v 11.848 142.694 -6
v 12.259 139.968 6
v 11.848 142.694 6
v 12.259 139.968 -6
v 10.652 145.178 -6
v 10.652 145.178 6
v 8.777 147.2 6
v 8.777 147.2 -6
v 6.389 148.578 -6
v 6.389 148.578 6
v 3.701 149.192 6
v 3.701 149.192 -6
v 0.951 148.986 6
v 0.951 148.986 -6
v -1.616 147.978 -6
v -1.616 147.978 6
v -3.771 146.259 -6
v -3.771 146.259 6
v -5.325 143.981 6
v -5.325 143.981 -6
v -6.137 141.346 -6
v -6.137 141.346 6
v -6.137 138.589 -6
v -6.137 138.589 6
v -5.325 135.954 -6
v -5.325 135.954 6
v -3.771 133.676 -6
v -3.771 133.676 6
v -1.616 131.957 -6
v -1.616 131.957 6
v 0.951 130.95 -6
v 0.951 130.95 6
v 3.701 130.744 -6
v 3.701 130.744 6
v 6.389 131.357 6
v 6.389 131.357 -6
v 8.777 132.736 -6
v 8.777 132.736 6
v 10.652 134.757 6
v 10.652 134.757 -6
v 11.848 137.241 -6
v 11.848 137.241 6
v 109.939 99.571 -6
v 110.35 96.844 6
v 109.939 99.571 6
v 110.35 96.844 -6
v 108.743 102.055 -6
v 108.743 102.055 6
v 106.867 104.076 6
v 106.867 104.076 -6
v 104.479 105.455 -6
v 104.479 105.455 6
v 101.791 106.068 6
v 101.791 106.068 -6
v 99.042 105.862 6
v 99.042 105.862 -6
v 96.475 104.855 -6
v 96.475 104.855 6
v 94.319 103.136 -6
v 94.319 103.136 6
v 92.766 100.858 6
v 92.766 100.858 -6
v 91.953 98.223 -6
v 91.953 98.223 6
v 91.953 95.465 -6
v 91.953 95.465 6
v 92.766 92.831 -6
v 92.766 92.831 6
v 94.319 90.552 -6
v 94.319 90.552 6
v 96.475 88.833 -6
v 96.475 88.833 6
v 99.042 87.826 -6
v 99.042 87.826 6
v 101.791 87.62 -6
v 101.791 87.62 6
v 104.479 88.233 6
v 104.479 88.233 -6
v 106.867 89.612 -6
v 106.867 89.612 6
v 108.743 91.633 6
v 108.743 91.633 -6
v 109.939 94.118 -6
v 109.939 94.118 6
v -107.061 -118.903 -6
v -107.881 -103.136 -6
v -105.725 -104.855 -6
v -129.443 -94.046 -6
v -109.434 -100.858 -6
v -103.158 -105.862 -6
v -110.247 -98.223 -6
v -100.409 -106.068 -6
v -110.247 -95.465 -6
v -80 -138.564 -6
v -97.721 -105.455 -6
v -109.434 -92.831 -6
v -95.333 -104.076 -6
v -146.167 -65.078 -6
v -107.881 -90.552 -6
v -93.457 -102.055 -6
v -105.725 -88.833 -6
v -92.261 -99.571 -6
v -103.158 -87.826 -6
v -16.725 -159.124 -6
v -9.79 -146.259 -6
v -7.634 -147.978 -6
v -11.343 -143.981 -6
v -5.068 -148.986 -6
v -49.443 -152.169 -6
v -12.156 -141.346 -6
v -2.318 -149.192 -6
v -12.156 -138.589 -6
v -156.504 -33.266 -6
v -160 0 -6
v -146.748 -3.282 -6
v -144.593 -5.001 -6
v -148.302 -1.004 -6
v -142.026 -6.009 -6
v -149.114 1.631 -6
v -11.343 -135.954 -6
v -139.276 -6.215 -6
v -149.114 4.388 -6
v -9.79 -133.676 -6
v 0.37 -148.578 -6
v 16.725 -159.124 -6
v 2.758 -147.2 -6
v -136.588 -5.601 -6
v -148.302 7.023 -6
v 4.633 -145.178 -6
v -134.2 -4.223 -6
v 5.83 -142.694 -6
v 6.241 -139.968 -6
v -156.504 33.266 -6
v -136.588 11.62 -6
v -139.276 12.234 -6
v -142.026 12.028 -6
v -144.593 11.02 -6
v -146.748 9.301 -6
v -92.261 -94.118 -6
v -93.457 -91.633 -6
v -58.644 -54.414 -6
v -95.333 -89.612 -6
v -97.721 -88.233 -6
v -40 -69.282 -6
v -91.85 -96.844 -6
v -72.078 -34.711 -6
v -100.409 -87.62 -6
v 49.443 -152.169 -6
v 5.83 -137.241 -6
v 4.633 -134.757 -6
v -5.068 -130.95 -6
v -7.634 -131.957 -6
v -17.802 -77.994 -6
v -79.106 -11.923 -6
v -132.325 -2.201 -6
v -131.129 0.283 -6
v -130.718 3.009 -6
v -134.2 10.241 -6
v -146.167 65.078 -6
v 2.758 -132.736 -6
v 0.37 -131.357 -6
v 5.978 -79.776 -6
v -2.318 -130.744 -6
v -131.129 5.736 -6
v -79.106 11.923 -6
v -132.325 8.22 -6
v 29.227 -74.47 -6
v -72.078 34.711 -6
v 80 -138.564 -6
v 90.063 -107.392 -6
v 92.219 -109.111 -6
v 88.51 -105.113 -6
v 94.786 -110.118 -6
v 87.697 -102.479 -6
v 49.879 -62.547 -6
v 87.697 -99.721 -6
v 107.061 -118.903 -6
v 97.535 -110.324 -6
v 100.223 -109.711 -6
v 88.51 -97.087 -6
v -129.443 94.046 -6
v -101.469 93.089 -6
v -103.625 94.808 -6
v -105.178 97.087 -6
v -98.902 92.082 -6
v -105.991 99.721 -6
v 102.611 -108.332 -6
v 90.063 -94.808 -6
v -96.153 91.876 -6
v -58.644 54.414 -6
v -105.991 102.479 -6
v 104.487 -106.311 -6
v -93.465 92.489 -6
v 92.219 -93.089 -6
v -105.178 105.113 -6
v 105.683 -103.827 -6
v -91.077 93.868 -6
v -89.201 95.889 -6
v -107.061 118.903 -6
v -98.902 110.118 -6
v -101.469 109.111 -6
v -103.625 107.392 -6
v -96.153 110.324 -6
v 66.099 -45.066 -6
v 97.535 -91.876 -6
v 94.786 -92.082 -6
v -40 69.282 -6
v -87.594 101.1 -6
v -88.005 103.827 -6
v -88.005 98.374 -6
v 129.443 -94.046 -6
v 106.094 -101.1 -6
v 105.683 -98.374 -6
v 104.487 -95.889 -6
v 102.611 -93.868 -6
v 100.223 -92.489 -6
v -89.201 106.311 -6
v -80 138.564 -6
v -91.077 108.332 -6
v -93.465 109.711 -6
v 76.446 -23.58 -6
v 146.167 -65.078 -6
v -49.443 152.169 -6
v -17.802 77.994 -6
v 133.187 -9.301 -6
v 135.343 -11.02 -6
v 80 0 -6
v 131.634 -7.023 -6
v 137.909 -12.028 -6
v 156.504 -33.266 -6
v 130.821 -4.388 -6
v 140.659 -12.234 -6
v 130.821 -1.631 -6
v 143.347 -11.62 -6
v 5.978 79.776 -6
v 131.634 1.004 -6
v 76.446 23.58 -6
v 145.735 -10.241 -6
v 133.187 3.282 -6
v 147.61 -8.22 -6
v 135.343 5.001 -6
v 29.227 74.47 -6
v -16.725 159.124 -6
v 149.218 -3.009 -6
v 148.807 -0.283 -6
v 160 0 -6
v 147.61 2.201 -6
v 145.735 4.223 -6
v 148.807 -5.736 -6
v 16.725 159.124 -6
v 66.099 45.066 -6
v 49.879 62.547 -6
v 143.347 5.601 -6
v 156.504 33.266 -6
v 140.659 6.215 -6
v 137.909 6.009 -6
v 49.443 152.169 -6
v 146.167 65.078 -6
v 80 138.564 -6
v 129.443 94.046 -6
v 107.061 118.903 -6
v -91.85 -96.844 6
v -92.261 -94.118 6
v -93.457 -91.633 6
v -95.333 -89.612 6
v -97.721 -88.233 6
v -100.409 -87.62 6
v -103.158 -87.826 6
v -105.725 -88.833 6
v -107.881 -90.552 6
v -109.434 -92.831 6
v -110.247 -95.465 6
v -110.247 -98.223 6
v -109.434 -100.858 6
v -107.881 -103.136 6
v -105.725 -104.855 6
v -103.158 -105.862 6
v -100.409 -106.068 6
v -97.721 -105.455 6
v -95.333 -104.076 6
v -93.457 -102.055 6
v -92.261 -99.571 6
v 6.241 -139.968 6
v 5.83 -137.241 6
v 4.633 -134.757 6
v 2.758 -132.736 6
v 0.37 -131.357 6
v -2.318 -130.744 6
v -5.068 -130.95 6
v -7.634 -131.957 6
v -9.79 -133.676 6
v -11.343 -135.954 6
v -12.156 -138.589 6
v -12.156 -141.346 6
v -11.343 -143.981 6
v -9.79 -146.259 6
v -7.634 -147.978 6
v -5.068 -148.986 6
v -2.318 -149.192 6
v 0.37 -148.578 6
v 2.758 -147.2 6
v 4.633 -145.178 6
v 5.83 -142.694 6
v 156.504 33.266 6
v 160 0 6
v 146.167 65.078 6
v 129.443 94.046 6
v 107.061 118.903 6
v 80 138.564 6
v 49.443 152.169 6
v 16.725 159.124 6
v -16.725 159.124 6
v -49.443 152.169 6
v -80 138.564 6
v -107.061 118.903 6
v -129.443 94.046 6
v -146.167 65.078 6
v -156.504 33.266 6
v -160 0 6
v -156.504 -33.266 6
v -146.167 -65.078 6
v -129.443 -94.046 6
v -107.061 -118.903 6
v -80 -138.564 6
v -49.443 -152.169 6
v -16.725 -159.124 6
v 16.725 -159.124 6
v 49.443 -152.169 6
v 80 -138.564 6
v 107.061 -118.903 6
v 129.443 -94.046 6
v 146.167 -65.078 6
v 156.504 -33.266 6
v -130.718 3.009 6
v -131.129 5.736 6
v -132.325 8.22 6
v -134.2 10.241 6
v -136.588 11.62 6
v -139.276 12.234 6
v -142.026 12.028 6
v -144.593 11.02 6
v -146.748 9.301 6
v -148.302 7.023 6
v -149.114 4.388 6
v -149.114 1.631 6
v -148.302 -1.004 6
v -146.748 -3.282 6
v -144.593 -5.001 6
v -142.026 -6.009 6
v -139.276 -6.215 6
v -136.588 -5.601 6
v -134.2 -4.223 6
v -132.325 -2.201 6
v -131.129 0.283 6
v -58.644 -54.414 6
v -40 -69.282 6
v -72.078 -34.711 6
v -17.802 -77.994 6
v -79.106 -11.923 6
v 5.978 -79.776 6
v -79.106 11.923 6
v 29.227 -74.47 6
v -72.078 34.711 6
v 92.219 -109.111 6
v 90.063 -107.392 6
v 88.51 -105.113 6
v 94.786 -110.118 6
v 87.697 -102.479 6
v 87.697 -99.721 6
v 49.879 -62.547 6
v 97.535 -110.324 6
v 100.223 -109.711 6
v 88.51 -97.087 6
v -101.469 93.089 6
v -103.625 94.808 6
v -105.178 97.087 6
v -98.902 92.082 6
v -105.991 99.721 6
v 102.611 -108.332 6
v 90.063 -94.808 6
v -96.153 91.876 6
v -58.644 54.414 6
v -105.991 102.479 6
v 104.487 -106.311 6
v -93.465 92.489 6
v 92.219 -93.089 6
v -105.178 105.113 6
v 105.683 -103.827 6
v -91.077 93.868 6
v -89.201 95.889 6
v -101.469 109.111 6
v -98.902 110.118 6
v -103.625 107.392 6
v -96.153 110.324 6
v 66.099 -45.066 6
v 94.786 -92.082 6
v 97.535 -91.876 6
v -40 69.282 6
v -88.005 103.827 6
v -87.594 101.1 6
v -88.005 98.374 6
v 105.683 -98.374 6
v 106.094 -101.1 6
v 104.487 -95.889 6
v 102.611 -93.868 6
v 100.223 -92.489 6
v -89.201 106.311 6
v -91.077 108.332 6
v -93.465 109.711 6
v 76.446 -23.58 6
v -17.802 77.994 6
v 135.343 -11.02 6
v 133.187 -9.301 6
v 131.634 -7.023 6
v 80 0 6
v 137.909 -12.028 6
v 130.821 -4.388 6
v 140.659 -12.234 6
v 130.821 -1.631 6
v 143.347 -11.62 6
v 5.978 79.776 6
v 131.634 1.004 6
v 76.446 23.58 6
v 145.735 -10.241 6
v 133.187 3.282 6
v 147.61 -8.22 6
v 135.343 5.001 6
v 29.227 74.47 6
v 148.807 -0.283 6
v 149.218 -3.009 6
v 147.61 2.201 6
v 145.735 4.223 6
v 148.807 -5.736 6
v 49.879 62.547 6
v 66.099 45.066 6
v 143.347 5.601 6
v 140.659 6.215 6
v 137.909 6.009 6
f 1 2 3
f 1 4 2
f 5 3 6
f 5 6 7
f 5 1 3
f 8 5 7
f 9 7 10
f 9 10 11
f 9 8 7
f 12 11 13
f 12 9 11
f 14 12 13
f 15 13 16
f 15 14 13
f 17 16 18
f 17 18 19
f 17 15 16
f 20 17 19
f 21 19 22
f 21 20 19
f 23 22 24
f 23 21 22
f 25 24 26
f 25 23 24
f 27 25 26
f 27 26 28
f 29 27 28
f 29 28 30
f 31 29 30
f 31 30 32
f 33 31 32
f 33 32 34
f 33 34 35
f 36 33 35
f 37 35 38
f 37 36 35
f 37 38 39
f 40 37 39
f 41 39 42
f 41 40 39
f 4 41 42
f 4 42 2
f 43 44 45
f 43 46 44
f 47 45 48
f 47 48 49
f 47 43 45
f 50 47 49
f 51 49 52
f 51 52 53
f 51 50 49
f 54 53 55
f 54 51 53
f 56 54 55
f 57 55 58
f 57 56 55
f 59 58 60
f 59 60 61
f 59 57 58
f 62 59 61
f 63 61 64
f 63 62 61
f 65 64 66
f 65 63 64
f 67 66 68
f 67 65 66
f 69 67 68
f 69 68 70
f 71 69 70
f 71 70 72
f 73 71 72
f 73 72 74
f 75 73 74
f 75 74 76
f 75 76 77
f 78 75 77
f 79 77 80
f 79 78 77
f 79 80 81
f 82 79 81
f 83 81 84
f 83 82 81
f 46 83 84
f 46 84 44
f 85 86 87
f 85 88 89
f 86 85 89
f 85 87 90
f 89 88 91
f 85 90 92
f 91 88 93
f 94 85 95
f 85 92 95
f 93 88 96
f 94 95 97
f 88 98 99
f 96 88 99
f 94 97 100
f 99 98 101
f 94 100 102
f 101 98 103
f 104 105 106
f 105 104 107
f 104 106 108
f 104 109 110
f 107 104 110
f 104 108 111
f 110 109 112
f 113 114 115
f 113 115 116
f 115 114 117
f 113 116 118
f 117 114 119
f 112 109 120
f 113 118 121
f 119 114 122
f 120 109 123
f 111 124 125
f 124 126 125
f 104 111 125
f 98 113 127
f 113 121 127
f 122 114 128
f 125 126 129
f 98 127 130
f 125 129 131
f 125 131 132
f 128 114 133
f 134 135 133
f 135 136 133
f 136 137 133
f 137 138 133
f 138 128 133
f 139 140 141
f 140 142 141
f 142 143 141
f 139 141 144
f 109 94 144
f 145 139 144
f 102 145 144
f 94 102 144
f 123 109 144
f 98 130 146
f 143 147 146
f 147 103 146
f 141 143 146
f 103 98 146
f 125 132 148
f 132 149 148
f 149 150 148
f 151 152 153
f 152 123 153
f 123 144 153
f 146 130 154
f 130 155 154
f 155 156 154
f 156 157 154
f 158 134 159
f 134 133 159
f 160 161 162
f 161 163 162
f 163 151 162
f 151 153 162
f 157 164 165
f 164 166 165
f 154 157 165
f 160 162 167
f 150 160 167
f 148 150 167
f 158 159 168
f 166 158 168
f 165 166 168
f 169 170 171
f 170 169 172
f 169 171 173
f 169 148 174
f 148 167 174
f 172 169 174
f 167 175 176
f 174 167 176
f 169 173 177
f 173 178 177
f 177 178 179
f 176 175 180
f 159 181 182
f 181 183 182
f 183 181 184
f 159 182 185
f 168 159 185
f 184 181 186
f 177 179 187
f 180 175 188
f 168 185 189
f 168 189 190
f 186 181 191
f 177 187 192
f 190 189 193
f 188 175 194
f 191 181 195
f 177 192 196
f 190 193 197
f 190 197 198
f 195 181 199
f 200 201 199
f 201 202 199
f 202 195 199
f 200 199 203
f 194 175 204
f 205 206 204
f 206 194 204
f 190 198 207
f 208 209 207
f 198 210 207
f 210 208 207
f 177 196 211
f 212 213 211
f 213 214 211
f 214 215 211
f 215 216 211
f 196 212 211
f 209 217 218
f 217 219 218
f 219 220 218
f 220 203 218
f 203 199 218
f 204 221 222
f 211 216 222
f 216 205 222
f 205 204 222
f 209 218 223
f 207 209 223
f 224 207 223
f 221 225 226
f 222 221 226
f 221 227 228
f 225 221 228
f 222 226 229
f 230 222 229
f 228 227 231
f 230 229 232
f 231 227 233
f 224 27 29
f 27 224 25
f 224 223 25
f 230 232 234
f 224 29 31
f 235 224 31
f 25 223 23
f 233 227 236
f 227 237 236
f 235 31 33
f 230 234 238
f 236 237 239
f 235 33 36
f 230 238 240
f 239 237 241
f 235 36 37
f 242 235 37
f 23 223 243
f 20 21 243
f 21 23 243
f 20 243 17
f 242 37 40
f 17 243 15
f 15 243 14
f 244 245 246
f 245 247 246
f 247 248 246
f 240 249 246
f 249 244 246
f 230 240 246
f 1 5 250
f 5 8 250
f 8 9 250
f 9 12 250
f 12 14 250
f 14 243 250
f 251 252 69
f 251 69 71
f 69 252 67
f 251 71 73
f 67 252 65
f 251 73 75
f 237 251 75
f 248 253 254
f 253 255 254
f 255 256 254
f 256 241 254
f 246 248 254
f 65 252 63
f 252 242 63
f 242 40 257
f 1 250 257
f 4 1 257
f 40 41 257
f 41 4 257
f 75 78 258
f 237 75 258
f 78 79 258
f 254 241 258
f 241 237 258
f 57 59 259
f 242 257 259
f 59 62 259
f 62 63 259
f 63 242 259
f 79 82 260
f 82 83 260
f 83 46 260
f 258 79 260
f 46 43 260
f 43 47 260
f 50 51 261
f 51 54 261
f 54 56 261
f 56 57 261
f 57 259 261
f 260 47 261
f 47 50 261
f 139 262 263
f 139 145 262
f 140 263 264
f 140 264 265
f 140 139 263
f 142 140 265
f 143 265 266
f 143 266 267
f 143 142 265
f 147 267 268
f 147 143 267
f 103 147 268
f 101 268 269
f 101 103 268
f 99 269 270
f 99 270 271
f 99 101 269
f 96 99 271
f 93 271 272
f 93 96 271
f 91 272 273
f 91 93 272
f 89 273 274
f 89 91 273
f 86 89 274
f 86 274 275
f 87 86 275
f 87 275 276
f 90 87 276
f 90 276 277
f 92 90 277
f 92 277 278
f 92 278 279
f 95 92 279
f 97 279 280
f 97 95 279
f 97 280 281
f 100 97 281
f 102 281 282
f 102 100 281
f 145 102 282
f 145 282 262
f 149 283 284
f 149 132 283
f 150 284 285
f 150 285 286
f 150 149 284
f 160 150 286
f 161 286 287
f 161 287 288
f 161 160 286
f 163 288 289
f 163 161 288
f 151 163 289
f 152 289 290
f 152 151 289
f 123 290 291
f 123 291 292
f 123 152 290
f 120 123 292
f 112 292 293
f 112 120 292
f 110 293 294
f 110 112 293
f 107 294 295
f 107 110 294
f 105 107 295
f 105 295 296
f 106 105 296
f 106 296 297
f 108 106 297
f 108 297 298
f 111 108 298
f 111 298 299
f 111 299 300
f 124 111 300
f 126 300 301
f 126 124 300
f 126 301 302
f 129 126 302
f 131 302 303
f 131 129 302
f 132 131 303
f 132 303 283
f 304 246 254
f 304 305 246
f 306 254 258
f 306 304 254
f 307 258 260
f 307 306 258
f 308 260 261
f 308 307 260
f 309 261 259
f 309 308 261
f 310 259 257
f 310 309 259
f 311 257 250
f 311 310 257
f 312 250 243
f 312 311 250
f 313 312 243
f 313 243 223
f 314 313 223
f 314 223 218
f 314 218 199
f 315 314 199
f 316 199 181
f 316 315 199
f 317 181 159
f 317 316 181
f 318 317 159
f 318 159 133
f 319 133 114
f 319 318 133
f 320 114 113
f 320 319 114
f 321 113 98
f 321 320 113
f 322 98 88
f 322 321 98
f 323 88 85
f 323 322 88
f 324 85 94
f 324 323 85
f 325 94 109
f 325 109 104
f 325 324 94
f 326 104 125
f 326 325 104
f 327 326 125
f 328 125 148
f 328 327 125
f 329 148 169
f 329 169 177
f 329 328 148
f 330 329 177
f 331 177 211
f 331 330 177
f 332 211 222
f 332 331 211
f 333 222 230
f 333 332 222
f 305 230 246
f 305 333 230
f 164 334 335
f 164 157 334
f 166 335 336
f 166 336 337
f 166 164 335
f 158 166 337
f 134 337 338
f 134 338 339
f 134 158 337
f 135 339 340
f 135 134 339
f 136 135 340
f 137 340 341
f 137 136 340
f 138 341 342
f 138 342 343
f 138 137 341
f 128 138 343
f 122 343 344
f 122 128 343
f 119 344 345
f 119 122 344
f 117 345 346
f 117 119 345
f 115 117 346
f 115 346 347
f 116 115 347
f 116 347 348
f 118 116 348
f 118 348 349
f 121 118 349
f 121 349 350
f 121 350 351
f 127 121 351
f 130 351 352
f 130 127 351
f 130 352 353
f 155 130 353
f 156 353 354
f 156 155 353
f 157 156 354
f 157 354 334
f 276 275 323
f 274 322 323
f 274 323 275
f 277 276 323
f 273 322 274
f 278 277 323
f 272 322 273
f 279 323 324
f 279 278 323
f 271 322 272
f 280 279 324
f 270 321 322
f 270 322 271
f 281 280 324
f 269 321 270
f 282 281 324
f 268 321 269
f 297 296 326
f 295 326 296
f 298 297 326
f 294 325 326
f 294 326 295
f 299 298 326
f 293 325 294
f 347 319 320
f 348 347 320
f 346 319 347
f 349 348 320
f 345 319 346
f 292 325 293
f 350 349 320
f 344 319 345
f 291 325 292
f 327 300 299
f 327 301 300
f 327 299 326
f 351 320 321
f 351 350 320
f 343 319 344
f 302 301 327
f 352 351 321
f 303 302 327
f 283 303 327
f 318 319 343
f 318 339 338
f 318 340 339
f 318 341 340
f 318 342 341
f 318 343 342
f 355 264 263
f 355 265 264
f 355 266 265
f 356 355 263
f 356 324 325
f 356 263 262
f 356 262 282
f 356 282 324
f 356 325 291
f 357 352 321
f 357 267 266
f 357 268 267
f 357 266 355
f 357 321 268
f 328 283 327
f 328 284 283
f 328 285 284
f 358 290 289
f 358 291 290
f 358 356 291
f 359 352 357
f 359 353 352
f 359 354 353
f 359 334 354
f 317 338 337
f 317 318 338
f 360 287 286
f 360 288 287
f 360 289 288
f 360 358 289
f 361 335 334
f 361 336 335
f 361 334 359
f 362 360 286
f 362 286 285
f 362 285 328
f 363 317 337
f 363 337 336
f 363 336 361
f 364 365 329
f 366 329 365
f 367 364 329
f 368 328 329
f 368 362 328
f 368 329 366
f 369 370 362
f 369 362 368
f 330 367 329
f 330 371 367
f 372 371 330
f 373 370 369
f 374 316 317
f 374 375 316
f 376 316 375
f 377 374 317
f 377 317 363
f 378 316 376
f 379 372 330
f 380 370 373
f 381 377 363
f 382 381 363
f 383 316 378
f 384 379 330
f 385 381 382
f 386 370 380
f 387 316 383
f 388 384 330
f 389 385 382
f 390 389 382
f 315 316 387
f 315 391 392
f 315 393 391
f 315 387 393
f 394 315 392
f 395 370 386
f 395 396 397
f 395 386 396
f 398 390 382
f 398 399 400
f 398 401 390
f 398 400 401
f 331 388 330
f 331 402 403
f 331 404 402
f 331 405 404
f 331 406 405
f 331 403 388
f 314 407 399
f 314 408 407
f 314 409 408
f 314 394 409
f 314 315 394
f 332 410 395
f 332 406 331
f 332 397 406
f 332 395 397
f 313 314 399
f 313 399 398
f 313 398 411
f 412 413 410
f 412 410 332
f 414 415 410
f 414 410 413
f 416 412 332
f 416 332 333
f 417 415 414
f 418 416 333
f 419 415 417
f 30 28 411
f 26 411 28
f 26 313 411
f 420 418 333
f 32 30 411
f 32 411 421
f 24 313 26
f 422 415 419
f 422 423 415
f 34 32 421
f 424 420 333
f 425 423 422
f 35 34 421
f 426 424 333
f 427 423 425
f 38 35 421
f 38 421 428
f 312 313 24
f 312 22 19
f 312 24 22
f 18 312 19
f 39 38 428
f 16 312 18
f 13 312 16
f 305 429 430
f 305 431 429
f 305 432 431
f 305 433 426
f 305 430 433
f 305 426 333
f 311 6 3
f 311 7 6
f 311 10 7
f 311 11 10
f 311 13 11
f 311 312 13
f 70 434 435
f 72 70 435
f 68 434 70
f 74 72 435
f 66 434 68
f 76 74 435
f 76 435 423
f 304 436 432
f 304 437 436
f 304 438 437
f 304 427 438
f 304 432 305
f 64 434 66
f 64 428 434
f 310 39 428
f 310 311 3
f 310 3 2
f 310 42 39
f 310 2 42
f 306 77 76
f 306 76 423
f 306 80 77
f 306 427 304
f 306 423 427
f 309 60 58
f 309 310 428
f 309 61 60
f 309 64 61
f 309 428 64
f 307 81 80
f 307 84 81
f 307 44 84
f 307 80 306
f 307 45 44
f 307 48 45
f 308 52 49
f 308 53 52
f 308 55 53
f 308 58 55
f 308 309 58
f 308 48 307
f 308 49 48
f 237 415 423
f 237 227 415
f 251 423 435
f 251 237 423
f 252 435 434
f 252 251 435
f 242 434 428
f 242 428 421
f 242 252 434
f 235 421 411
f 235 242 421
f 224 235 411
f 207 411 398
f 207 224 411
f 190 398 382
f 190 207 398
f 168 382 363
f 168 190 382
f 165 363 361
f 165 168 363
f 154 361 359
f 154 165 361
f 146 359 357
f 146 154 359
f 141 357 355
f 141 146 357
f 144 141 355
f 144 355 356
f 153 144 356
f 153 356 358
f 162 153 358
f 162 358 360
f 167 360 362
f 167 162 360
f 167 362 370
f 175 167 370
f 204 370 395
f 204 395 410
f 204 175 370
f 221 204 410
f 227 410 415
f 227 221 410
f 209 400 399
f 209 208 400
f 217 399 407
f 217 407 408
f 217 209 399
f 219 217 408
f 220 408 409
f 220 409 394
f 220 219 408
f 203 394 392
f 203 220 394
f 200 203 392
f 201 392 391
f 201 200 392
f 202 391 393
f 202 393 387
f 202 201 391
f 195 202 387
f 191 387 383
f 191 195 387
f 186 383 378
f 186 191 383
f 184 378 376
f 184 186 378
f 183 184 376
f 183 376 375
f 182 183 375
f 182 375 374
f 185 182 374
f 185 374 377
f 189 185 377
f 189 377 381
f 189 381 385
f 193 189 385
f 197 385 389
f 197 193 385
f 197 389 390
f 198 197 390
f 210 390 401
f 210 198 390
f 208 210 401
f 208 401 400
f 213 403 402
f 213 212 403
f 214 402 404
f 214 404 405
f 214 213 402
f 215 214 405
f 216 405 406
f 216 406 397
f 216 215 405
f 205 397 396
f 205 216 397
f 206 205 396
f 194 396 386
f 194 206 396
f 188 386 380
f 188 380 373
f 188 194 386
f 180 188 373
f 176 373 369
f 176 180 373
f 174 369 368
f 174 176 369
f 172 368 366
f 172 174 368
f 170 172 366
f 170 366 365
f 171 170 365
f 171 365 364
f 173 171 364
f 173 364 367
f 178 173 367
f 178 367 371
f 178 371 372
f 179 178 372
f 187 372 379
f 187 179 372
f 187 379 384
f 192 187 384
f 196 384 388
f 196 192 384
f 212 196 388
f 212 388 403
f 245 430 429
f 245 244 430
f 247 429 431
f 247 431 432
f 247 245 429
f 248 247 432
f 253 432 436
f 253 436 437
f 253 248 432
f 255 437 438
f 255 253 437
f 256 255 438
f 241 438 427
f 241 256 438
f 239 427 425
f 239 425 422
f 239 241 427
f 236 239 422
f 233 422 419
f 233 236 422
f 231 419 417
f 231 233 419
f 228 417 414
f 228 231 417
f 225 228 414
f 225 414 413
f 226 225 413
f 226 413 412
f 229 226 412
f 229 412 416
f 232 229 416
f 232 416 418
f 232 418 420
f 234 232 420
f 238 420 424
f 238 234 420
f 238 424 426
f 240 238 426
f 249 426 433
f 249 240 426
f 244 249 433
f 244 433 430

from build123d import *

# Parameters (mm, degrees)
SKETCH1_R           = 160
SKETCH1_R_2         = 80
SKETCH1_R_3         = 9.25
BOSS_EXTRUDE1_DEPTH = 6


with BuildPart() as part:
    # Sketch1 → Boss-Extrude1 (new, symmetric)
    with BuildSketch(Plane.XY):
        Circle(SKETCH1_R)
        Circle(SKETCH1_R_2, mode=Mode.SUBTRACT)
        with Locations((-96.844081606, 101.100068535)):
            Circle(SKETCH1_R_3, mode=Mode.SUBTRACT)
        with Locations((3.009437218, 139.967650861)):
            Circle(SKETCH1_R_3, mode=Mode.SUBTRACT)
        with Locations((101.100068535, 96.844081606)):
            Circle(SKETCH1_R_3, mode=Mode.SUBTRACT)
        with Locations((139.967650861, -3.009437218)):
            Circle(SKETCH1_R_3, mode=Mode.SUBTRACT)
        with Locations((96.844081606, -101.100068535)):
            Circle(SKETCH1_R_3, mode=Mode.SUBTRACT)
        with Locations((-3.009437218, -139.967650861)):
            Circle(SKETCH1_R_3, mode=Mode.SUBTRACT)
        with Locations((-101.100068535, -96.844081606)):
            Circle(SKETCH1_R_3, mode=Mode.SUBTRACT)
        with Locations((-139.967650861, 3.009437218)):
            Circle(SKETCH1_R_3, mode=Mode.SUBTRACT)
    extrude(amount=BOSS_EXTRUDE1_DEPTH, both=True)


solid = part.part
